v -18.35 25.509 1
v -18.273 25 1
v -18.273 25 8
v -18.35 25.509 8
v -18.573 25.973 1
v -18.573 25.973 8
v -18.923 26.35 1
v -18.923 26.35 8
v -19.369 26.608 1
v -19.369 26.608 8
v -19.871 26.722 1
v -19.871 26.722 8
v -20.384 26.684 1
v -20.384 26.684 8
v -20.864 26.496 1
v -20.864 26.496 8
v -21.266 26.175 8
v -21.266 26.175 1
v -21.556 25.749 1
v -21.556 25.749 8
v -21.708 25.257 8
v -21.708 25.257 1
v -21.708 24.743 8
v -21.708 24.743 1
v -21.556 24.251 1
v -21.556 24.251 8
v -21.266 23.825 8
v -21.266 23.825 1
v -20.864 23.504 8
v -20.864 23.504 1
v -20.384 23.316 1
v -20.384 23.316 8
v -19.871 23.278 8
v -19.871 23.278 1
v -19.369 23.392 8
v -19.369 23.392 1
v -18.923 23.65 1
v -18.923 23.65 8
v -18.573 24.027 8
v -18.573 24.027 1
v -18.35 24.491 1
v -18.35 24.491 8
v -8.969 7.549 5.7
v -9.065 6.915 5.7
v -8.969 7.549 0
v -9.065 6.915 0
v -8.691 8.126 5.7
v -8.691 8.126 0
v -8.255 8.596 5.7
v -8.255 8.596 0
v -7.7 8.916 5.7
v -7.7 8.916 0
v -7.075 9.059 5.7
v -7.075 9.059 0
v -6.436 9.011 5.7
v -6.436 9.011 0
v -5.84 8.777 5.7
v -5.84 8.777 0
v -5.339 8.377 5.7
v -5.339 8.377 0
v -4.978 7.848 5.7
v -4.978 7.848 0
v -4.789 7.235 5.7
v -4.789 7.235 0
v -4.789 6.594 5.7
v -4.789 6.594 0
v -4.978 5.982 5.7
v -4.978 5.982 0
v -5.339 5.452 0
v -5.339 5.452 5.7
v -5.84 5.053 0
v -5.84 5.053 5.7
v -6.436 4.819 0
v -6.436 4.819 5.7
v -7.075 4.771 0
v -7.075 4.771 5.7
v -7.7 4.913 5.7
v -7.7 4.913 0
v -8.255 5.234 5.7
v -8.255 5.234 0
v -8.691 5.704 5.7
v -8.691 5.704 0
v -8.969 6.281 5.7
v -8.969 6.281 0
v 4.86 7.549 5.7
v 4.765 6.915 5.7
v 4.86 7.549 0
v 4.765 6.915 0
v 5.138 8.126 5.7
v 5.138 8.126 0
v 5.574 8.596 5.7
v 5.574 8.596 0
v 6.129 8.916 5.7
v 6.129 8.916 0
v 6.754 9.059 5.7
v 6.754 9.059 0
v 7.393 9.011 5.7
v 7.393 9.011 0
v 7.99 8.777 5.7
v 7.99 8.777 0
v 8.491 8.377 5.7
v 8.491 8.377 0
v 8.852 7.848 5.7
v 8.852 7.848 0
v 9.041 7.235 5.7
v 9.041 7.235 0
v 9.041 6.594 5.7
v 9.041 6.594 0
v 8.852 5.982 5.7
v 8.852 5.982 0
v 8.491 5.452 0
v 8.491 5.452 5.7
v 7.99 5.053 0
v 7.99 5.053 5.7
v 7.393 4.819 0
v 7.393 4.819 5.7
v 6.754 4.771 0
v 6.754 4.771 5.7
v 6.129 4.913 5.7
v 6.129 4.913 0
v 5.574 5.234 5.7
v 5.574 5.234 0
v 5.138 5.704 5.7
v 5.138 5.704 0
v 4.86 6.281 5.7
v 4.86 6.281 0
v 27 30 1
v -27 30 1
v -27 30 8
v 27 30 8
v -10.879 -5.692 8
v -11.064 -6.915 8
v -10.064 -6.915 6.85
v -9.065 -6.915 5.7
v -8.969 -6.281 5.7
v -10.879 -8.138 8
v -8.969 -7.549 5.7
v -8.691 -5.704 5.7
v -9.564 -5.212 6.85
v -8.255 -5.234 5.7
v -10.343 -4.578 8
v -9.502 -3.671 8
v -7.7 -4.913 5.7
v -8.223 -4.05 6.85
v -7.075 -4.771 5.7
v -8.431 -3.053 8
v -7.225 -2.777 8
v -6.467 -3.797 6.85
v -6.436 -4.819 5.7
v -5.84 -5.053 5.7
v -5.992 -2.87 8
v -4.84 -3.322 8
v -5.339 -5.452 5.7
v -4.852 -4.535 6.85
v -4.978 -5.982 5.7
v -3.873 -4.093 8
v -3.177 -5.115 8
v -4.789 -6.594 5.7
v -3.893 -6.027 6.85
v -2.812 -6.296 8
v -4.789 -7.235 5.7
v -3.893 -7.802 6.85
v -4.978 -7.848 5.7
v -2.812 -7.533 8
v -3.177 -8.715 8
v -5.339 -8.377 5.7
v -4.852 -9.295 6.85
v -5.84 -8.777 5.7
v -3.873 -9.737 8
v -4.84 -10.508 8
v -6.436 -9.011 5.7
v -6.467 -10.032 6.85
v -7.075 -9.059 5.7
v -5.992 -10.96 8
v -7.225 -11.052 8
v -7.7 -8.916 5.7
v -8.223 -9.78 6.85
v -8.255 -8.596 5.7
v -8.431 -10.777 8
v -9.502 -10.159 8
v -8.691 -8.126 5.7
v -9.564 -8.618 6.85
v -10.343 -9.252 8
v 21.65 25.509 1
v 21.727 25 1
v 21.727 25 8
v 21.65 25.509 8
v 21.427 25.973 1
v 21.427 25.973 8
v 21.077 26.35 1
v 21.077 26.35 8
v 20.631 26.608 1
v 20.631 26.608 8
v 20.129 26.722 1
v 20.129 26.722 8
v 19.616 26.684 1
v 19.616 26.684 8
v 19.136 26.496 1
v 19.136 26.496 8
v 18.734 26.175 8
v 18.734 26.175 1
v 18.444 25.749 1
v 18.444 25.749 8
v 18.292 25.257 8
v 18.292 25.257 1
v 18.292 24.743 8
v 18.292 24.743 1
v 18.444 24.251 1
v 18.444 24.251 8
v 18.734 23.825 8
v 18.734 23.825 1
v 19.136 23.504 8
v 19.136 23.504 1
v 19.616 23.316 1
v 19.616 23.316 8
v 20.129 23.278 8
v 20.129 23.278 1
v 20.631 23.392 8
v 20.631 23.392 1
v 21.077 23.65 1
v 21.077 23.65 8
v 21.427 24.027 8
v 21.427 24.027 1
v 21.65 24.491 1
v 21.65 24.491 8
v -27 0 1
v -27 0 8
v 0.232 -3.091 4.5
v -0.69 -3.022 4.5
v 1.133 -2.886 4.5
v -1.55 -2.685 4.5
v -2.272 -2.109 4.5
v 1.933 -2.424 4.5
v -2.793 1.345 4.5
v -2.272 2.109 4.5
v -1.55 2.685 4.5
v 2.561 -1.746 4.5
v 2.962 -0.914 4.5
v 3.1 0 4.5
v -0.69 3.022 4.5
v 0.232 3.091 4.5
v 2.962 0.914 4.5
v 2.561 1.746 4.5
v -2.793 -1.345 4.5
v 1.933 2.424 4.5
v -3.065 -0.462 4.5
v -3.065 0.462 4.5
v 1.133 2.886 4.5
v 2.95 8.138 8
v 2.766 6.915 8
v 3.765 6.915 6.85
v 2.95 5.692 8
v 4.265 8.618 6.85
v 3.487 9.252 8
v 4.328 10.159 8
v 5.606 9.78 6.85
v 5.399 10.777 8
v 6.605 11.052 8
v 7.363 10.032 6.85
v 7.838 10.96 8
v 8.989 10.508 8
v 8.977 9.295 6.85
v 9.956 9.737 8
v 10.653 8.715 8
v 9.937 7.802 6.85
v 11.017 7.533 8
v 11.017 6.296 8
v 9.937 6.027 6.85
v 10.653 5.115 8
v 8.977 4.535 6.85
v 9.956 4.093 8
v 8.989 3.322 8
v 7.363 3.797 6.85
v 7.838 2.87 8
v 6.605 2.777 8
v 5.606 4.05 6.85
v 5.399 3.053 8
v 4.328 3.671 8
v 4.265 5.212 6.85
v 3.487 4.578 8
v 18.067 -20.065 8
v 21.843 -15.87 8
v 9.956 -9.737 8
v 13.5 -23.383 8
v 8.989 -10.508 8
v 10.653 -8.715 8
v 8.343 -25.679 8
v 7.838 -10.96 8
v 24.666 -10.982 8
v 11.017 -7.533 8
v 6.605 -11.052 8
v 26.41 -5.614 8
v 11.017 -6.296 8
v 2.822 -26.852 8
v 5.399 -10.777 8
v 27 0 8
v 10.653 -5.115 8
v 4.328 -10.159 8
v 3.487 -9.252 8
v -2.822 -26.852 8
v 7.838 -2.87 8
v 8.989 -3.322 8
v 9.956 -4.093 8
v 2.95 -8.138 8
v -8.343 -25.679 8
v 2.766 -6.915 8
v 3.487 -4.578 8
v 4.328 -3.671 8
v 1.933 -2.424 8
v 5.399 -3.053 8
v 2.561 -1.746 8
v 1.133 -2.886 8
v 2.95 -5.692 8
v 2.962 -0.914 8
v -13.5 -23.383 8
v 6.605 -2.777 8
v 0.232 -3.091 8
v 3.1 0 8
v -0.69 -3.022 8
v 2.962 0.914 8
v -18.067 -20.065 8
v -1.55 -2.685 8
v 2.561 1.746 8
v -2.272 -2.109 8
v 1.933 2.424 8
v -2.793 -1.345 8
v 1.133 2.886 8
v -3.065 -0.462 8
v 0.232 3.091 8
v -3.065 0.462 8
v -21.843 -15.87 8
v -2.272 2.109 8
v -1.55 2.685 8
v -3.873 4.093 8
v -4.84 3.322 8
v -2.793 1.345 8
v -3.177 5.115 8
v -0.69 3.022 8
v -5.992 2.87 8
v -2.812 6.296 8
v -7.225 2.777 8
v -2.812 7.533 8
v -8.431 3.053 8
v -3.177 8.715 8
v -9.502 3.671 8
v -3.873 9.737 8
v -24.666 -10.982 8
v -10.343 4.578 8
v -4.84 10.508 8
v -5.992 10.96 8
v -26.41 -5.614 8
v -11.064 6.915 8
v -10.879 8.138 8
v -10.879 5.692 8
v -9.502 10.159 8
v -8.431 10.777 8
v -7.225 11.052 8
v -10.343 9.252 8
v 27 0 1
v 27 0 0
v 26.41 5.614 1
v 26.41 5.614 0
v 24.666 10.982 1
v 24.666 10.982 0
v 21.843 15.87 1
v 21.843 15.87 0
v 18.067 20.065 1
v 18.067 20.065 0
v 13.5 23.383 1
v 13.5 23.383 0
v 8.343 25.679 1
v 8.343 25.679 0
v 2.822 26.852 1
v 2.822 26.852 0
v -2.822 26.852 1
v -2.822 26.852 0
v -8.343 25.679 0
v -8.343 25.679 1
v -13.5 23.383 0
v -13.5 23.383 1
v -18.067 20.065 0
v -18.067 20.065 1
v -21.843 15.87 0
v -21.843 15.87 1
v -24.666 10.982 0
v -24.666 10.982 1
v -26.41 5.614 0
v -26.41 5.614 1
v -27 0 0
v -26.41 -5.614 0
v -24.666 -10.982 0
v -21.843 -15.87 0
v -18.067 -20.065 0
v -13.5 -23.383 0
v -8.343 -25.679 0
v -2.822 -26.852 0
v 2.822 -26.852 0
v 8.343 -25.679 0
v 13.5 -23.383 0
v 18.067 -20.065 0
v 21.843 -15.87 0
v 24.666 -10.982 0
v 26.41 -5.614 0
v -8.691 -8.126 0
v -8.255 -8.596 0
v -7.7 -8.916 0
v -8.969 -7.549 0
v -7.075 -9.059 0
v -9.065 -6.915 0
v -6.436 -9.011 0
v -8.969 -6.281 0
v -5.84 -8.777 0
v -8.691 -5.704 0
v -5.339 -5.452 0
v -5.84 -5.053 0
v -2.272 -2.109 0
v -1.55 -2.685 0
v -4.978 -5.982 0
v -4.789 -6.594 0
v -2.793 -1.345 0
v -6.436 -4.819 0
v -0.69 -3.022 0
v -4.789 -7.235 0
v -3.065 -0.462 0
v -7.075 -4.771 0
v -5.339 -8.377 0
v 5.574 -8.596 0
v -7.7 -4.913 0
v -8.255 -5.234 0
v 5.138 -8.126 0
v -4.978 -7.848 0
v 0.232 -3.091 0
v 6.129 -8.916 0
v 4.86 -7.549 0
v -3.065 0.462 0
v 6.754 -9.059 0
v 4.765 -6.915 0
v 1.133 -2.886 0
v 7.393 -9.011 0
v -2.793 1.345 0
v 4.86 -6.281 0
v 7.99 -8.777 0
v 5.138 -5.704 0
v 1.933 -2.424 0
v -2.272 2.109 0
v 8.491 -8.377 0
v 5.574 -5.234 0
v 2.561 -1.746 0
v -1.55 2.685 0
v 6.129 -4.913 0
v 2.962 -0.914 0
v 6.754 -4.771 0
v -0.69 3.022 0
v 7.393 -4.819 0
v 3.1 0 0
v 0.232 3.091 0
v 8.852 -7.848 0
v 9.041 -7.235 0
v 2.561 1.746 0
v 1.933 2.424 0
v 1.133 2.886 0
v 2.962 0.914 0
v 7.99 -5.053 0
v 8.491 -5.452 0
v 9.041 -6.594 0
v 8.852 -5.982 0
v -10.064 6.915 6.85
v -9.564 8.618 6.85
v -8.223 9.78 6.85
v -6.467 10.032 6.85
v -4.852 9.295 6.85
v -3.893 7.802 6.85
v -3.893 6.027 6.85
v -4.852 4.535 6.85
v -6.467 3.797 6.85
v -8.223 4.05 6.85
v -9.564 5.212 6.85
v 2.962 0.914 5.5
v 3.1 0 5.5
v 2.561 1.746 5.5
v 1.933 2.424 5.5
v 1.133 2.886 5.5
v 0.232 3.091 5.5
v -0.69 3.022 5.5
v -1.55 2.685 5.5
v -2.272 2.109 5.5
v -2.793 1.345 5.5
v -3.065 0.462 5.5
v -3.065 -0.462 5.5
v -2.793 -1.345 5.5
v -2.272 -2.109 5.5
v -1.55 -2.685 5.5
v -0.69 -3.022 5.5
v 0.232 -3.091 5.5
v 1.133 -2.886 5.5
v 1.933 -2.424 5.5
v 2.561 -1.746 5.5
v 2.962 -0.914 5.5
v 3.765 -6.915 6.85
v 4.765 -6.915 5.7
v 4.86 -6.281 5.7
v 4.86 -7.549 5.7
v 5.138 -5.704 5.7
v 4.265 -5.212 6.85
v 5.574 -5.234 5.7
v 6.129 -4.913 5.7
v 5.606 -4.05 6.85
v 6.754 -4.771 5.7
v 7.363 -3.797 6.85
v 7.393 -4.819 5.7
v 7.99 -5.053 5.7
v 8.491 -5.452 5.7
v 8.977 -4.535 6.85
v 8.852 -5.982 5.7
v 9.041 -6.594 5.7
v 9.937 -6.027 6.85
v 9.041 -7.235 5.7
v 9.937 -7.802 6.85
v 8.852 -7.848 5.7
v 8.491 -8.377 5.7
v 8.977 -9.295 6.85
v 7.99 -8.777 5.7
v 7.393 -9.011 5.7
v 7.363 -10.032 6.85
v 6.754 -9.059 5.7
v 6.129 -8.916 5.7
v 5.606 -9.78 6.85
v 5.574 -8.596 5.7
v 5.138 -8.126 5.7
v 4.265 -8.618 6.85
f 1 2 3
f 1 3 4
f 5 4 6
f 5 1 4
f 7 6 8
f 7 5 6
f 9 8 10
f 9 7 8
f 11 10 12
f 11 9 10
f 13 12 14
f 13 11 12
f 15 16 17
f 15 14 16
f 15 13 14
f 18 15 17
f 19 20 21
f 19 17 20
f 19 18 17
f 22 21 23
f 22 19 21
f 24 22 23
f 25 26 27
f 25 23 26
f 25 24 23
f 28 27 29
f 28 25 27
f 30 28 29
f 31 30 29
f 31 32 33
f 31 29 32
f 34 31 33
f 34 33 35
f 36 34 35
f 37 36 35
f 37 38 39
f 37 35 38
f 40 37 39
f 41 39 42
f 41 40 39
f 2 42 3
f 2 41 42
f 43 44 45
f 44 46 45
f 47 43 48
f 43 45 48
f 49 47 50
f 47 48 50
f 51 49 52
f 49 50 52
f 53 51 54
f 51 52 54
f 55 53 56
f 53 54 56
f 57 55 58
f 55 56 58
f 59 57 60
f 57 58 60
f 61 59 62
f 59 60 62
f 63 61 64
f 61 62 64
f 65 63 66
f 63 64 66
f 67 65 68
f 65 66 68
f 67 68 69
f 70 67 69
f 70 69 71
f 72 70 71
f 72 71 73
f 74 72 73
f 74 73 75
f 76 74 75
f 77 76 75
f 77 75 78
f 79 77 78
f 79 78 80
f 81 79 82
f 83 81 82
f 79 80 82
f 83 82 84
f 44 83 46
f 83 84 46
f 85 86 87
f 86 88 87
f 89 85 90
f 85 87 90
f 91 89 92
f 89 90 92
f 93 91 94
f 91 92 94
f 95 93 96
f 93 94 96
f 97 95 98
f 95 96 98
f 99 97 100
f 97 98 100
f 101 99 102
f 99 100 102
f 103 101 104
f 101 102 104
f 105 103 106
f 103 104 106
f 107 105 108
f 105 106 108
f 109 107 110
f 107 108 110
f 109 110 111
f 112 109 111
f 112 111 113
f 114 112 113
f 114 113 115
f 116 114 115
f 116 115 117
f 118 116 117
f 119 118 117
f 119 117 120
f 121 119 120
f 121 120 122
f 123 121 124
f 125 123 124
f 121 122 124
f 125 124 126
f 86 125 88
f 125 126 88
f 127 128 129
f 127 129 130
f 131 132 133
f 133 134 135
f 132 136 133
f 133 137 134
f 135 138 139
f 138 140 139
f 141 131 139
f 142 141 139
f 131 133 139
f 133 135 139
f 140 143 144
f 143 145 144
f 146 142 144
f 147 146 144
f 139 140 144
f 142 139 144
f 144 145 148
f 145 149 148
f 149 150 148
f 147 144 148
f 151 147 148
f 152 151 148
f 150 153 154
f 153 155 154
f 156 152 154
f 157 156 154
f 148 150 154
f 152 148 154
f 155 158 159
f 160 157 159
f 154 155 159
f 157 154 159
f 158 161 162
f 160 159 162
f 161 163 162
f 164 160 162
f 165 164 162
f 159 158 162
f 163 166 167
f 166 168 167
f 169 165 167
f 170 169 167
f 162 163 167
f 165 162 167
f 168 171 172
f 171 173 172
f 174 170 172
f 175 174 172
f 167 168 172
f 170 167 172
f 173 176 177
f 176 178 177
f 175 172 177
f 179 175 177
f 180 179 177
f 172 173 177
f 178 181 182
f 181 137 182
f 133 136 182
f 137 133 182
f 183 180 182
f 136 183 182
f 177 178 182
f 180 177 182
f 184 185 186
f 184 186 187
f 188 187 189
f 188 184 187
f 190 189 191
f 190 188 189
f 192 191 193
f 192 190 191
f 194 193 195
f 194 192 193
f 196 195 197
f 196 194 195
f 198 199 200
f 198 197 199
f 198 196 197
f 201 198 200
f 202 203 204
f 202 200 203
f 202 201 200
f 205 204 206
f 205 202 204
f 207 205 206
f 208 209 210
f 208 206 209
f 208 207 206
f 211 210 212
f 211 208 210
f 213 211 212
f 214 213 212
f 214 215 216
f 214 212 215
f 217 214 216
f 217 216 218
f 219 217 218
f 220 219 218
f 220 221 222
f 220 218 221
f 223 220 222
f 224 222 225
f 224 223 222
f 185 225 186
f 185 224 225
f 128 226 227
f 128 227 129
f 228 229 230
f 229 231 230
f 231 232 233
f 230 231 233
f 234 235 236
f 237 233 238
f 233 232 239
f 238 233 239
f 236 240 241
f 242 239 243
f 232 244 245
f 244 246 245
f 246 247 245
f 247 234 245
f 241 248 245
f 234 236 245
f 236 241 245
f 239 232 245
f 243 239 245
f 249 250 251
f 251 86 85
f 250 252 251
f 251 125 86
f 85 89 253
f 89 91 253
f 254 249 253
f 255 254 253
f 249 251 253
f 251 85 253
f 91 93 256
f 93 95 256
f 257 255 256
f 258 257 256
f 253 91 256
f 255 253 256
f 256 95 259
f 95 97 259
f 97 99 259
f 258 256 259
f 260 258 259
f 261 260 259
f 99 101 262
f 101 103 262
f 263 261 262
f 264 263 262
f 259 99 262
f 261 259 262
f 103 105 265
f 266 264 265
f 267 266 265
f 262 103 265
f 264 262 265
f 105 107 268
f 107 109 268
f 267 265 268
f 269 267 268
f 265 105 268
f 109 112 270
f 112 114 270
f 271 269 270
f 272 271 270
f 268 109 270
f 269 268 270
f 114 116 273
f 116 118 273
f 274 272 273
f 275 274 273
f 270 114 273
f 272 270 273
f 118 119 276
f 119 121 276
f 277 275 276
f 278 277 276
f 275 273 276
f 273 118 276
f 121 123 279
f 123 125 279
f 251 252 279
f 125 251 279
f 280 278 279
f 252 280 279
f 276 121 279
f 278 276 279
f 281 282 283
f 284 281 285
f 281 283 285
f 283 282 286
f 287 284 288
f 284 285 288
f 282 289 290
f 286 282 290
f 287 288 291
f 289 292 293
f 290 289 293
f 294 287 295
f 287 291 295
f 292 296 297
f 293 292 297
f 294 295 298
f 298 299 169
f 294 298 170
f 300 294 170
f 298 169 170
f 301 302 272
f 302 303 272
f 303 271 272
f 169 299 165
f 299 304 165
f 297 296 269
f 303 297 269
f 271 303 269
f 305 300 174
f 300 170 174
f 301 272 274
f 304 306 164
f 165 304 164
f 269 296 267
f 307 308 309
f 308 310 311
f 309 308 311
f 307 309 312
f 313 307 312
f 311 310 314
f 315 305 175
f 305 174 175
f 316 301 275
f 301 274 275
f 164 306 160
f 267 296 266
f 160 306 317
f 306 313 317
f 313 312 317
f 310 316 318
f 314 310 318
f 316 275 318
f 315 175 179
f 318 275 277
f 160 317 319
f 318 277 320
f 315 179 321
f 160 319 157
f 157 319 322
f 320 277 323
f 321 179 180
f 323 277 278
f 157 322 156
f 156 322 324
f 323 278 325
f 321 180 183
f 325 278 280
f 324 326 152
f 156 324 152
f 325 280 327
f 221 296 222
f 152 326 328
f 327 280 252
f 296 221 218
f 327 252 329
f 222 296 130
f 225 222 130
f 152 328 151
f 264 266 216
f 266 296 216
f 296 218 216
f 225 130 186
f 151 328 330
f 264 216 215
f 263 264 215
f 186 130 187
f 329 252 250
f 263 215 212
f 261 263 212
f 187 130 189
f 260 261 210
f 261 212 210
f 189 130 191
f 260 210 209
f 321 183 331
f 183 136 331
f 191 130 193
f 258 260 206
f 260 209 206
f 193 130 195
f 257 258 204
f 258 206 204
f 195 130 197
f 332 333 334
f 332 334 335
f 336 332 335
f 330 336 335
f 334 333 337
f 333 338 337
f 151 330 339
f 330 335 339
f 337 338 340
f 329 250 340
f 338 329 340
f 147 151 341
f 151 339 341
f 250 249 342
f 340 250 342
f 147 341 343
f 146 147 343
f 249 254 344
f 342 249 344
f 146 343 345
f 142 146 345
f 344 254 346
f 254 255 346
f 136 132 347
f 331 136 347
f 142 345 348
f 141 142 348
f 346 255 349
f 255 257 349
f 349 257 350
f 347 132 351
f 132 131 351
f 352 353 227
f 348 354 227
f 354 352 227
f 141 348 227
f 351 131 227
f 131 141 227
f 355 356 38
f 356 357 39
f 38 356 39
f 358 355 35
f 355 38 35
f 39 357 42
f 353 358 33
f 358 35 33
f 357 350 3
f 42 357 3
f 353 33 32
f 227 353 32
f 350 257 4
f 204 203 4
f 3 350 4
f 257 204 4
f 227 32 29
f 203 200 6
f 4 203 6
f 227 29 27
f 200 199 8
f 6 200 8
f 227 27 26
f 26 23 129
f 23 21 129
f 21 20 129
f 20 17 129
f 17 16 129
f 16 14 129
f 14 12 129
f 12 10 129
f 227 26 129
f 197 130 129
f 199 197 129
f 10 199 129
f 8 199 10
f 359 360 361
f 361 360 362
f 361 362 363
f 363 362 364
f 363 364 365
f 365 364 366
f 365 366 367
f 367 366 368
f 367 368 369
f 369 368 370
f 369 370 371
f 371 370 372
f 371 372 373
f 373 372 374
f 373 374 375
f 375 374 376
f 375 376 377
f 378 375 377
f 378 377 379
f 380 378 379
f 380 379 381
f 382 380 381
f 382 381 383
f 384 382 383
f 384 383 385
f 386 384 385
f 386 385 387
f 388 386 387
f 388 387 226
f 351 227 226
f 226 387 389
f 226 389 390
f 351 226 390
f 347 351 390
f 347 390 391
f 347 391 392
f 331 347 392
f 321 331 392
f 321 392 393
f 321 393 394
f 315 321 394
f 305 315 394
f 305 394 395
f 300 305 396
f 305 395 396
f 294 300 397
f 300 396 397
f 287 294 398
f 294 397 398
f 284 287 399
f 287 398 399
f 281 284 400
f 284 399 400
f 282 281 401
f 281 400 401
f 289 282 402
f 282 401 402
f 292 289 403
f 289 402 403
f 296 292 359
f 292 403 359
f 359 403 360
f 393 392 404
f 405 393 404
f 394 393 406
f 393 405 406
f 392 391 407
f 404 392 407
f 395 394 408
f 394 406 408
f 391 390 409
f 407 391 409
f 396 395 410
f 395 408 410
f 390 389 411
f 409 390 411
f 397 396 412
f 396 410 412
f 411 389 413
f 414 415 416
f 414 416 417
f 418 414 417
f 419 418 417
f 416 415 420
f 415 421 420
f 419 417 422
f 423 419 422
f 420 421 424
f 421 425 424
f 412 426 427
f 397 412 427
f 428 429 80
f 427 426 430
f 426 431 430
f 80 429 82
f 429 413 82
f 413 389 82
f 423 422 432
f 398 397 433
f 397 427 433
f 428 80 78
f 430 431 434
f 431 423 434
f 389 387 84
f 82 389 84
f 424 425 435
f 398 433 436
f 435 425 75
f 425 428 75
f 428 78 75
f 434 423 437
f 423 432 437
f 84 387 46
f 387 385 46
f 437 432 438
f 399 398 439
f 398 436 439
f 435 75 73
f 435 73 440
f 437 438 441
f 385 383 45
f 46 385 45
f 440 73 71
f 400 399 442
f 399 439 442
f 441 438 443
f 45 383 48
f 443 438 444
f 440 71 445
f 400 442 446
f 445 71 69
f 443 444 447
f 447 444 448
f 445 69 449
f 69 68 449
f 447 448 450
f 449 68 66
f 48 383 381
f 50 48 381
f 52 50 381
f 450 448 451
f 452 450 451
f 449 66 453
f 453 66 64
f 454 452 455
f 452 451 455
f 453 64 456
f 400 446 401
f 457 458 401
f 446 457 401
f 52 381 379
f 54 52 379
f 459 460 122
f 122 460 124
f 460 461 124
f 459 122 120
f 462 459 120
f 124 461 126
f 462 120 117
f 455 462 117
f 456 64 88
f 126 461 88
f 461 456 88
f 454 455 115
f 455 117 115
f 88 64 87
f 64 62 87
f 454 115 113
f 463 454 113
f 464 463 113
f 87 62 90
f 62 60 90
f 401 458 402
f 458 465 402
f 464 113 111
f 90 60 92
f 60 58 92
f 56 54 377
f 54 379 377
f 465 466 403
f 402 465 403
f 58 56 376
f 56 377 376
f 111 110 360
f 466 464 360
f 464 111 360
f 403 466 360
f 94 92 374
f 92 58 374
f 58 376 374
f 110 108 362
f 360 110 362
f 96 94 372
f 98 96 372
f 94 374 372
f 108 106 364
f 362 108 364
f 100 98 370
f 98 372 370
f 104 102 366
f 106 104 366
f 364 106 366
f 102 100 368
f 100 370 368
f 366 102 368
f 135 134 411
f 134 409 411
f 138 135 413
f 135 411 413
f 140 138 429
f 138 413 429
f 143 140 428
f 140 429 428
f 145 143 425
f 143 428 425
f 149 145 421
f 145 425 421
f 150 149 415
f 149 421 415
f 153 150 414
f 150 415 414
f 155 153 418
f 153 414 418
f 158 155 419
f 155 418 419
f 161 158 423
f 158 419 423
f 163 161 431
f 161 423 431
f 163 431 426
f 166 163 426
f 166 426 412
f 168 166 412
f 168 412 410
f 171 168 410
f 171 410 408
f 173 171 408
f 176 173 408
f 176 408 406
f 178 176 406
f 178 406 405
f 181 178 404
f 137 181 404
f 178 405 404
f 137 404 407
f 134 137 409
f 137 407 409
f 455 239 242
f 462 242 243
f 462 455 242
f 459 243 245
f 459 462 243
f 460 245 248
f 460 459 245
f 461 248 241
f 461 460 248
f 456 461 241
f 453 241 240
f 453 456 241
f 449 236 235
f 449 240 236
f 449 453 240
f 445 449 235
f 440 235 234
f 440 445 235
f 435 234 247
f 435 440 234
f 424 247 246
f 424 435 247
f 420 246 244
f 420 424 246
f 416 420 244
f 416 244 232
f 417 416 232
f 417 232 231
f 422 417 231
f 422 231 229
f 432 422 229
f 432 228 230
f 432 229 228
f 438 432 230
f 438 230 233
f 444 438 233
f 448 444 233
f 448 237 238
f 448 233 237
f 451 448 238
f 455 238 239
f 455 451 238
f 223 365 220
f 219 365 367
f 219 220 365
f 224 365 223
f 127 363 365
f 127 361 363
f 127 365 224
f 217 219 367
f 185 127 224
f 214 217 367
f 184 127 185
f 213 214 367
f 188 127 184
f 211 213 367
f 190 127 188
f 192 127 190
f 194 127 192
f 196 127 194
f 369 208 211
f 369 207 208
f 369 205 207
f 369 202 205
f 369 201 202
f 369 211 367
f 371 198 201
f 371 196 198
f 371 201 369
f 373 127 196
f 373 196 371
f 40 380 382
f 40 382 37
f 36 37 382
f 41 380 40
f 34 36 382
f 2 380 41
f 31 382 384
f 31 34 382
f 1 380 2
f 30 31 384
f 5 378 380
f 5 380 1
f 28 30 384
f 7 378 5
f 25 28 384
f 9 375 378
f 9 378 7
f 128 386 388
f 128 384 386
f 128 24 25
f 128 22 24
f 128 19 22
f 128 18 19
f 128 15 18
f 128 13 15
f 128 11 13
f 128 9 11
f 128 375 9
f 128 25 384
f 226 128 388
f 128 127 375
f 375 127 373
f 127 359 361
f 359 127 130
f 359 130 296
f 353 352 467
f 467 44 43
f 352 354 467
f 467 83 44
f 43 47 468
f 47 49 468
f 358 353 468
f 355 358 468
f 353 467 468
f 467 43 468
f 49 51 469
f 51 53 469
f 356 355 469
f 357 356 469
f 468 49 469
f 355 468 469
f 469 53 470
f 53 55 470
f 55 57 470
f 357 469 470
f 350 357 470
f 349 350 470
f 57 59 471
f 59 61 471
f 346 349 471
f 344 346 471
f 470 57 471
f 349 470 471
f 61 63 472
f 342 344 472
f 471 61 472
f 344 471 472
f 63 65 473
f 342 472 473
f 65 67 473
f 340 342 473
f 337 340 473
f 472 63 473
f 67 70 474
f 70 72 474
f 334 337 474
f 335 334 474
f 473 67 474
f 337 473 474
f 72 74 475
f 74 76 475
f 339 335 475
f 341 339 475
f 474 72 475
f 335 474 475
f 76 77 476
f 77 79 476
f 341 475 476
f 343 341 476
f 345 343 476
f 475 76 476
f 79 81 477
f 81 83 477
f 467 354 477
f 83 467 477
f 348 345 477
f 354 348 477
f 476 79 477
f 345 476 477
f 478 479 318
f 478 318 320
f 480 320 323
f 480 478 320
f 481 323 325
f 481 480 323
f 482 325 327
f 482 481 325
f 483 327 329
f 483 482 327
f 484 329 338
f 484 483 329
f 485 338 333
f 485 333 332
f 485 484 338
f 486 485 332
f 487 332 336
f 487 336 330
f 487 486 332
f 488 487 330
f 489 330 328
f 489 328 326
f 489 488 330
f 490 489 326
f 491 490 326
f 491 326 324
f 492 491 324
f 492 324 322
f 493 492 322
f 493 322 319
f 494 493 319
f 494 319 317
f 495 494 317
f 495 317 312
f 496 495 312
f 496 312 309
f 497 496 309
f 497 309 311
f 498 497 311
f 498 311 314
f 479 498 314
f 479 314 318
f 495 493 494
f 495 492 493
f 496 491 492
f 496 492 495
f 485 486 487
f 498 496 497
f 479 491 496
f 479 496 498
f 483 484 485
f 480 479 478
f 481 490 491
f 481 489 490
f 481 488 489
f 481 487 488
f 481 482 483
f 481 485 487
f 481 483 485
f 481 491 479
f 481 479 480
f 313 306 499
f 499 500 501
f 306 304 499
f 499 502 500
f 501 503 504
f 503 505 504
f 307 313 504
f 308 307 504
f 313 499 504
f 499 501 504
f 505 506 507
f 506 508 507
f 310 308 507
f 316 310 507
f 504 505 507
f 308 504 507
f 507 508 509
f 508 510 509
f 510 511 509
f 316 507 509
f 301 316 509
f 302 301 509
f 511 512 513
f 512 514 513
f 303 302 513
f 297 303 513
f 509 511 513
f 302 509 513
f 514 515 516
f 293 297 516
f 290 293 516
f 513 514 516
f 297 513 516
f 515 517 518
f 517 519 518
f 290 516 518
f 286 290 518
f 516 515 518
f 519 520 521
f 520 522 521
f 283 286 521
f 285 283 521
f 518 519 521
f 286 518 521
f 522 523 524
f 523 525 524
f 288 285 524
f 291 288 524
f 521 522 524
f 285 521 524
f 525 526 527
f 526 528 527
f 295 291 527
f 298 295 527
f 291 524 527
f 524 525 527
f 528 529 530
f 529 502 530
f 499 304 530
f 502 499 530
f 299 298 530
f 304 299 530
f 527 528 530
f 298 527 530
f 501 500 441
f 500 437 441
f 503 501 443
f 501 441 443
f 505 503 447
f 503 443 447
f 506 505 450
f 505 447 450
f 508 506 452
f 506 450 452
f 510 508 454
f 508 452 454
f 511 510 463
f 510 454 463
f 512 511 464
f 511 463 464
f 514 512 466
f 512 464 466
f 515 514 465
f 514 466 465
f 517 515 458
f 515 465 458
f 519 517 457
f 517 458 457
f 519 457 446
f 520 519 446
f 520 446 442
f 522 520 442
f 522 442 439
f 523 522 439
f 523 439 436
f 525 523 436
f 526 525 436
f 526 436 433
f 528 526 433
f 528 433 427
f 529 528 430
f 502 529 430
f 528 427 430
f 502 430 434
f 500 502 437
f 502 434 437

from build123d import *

# Parameters (mm, degrees)
SKETCH008_R      = 27
SKETCH008_R_2    = 3.1
PAD007_DEPTH     = 8
HOLE_D           = 4.3
HOLE_CSINK_D     = 8.298
HOLE_CSINK_ANGLE = 82
SKETCH075_R      = 4
PAD048_DEPTH     = 1
PAD054_DEPTH     = 7
SKETCH089_R      = 1.7272
POCKET028_DEPTH  = 8.001


with BuildPart() as part:
    # Sketch008 → Pad007 (new body)
    with BuildSketch(Plane.XY):
        Circle(SKETCH008_R)
        Circle(SKETCH008_R_2, mode=Mode.SUBTRACT)
    extrude(amount=PAD007_DEPTH)

    # Hole (through all)
    with Locations(Plane.XY.offset(8)):
        with Locations((-6.914797, 6.914797), (6.914797, 6.914797), (6.914797, -6.914797), (-6.914797, -6.914797)):
            CounterSinkHole(HOLE_D / 2, HOLE_CSINK_D / 2, counter_sink_angle=HOLE_CSINK_ANGLE)

    # Sketch075 → Pad048 (join)
    with BuildSketch(Plane.XY.offset(4.5)):
        Circle(SKETCH075_R)
    extrude(amount=PAD048_DEPTH)

    # Sketch088 → Pad054 (join)
    with BuildSketch(Plane.XY.offset(1)):
        with BuildLine():
            Line((-27, 0), (-27, 30))
            Line((-27, 30), (27, 30))
            Line((27, 30), (27, 0))
            Line((27, 0), (26.5, 0))
            ThreePointArc((26.5, 0), (0, 26.5), (-26.5, 0))
            Line((-26.5, 0), (-27, 0))
        make_face()
    extrude(amount=PAD054_DEPTH)

    # Sketch089 → Pocket028 (cut, through all)
    with BuildSketch(Plane.XY):
        with Locations((-20, 25)):
            Circle(SKETCH089_R)
        with Locations((20, 25)):
            Circle(SKETCH089_R)
    extrude(amount=POCKET028_DEPTH, mode=Mode.SUBTRACT)


solid = part.part
